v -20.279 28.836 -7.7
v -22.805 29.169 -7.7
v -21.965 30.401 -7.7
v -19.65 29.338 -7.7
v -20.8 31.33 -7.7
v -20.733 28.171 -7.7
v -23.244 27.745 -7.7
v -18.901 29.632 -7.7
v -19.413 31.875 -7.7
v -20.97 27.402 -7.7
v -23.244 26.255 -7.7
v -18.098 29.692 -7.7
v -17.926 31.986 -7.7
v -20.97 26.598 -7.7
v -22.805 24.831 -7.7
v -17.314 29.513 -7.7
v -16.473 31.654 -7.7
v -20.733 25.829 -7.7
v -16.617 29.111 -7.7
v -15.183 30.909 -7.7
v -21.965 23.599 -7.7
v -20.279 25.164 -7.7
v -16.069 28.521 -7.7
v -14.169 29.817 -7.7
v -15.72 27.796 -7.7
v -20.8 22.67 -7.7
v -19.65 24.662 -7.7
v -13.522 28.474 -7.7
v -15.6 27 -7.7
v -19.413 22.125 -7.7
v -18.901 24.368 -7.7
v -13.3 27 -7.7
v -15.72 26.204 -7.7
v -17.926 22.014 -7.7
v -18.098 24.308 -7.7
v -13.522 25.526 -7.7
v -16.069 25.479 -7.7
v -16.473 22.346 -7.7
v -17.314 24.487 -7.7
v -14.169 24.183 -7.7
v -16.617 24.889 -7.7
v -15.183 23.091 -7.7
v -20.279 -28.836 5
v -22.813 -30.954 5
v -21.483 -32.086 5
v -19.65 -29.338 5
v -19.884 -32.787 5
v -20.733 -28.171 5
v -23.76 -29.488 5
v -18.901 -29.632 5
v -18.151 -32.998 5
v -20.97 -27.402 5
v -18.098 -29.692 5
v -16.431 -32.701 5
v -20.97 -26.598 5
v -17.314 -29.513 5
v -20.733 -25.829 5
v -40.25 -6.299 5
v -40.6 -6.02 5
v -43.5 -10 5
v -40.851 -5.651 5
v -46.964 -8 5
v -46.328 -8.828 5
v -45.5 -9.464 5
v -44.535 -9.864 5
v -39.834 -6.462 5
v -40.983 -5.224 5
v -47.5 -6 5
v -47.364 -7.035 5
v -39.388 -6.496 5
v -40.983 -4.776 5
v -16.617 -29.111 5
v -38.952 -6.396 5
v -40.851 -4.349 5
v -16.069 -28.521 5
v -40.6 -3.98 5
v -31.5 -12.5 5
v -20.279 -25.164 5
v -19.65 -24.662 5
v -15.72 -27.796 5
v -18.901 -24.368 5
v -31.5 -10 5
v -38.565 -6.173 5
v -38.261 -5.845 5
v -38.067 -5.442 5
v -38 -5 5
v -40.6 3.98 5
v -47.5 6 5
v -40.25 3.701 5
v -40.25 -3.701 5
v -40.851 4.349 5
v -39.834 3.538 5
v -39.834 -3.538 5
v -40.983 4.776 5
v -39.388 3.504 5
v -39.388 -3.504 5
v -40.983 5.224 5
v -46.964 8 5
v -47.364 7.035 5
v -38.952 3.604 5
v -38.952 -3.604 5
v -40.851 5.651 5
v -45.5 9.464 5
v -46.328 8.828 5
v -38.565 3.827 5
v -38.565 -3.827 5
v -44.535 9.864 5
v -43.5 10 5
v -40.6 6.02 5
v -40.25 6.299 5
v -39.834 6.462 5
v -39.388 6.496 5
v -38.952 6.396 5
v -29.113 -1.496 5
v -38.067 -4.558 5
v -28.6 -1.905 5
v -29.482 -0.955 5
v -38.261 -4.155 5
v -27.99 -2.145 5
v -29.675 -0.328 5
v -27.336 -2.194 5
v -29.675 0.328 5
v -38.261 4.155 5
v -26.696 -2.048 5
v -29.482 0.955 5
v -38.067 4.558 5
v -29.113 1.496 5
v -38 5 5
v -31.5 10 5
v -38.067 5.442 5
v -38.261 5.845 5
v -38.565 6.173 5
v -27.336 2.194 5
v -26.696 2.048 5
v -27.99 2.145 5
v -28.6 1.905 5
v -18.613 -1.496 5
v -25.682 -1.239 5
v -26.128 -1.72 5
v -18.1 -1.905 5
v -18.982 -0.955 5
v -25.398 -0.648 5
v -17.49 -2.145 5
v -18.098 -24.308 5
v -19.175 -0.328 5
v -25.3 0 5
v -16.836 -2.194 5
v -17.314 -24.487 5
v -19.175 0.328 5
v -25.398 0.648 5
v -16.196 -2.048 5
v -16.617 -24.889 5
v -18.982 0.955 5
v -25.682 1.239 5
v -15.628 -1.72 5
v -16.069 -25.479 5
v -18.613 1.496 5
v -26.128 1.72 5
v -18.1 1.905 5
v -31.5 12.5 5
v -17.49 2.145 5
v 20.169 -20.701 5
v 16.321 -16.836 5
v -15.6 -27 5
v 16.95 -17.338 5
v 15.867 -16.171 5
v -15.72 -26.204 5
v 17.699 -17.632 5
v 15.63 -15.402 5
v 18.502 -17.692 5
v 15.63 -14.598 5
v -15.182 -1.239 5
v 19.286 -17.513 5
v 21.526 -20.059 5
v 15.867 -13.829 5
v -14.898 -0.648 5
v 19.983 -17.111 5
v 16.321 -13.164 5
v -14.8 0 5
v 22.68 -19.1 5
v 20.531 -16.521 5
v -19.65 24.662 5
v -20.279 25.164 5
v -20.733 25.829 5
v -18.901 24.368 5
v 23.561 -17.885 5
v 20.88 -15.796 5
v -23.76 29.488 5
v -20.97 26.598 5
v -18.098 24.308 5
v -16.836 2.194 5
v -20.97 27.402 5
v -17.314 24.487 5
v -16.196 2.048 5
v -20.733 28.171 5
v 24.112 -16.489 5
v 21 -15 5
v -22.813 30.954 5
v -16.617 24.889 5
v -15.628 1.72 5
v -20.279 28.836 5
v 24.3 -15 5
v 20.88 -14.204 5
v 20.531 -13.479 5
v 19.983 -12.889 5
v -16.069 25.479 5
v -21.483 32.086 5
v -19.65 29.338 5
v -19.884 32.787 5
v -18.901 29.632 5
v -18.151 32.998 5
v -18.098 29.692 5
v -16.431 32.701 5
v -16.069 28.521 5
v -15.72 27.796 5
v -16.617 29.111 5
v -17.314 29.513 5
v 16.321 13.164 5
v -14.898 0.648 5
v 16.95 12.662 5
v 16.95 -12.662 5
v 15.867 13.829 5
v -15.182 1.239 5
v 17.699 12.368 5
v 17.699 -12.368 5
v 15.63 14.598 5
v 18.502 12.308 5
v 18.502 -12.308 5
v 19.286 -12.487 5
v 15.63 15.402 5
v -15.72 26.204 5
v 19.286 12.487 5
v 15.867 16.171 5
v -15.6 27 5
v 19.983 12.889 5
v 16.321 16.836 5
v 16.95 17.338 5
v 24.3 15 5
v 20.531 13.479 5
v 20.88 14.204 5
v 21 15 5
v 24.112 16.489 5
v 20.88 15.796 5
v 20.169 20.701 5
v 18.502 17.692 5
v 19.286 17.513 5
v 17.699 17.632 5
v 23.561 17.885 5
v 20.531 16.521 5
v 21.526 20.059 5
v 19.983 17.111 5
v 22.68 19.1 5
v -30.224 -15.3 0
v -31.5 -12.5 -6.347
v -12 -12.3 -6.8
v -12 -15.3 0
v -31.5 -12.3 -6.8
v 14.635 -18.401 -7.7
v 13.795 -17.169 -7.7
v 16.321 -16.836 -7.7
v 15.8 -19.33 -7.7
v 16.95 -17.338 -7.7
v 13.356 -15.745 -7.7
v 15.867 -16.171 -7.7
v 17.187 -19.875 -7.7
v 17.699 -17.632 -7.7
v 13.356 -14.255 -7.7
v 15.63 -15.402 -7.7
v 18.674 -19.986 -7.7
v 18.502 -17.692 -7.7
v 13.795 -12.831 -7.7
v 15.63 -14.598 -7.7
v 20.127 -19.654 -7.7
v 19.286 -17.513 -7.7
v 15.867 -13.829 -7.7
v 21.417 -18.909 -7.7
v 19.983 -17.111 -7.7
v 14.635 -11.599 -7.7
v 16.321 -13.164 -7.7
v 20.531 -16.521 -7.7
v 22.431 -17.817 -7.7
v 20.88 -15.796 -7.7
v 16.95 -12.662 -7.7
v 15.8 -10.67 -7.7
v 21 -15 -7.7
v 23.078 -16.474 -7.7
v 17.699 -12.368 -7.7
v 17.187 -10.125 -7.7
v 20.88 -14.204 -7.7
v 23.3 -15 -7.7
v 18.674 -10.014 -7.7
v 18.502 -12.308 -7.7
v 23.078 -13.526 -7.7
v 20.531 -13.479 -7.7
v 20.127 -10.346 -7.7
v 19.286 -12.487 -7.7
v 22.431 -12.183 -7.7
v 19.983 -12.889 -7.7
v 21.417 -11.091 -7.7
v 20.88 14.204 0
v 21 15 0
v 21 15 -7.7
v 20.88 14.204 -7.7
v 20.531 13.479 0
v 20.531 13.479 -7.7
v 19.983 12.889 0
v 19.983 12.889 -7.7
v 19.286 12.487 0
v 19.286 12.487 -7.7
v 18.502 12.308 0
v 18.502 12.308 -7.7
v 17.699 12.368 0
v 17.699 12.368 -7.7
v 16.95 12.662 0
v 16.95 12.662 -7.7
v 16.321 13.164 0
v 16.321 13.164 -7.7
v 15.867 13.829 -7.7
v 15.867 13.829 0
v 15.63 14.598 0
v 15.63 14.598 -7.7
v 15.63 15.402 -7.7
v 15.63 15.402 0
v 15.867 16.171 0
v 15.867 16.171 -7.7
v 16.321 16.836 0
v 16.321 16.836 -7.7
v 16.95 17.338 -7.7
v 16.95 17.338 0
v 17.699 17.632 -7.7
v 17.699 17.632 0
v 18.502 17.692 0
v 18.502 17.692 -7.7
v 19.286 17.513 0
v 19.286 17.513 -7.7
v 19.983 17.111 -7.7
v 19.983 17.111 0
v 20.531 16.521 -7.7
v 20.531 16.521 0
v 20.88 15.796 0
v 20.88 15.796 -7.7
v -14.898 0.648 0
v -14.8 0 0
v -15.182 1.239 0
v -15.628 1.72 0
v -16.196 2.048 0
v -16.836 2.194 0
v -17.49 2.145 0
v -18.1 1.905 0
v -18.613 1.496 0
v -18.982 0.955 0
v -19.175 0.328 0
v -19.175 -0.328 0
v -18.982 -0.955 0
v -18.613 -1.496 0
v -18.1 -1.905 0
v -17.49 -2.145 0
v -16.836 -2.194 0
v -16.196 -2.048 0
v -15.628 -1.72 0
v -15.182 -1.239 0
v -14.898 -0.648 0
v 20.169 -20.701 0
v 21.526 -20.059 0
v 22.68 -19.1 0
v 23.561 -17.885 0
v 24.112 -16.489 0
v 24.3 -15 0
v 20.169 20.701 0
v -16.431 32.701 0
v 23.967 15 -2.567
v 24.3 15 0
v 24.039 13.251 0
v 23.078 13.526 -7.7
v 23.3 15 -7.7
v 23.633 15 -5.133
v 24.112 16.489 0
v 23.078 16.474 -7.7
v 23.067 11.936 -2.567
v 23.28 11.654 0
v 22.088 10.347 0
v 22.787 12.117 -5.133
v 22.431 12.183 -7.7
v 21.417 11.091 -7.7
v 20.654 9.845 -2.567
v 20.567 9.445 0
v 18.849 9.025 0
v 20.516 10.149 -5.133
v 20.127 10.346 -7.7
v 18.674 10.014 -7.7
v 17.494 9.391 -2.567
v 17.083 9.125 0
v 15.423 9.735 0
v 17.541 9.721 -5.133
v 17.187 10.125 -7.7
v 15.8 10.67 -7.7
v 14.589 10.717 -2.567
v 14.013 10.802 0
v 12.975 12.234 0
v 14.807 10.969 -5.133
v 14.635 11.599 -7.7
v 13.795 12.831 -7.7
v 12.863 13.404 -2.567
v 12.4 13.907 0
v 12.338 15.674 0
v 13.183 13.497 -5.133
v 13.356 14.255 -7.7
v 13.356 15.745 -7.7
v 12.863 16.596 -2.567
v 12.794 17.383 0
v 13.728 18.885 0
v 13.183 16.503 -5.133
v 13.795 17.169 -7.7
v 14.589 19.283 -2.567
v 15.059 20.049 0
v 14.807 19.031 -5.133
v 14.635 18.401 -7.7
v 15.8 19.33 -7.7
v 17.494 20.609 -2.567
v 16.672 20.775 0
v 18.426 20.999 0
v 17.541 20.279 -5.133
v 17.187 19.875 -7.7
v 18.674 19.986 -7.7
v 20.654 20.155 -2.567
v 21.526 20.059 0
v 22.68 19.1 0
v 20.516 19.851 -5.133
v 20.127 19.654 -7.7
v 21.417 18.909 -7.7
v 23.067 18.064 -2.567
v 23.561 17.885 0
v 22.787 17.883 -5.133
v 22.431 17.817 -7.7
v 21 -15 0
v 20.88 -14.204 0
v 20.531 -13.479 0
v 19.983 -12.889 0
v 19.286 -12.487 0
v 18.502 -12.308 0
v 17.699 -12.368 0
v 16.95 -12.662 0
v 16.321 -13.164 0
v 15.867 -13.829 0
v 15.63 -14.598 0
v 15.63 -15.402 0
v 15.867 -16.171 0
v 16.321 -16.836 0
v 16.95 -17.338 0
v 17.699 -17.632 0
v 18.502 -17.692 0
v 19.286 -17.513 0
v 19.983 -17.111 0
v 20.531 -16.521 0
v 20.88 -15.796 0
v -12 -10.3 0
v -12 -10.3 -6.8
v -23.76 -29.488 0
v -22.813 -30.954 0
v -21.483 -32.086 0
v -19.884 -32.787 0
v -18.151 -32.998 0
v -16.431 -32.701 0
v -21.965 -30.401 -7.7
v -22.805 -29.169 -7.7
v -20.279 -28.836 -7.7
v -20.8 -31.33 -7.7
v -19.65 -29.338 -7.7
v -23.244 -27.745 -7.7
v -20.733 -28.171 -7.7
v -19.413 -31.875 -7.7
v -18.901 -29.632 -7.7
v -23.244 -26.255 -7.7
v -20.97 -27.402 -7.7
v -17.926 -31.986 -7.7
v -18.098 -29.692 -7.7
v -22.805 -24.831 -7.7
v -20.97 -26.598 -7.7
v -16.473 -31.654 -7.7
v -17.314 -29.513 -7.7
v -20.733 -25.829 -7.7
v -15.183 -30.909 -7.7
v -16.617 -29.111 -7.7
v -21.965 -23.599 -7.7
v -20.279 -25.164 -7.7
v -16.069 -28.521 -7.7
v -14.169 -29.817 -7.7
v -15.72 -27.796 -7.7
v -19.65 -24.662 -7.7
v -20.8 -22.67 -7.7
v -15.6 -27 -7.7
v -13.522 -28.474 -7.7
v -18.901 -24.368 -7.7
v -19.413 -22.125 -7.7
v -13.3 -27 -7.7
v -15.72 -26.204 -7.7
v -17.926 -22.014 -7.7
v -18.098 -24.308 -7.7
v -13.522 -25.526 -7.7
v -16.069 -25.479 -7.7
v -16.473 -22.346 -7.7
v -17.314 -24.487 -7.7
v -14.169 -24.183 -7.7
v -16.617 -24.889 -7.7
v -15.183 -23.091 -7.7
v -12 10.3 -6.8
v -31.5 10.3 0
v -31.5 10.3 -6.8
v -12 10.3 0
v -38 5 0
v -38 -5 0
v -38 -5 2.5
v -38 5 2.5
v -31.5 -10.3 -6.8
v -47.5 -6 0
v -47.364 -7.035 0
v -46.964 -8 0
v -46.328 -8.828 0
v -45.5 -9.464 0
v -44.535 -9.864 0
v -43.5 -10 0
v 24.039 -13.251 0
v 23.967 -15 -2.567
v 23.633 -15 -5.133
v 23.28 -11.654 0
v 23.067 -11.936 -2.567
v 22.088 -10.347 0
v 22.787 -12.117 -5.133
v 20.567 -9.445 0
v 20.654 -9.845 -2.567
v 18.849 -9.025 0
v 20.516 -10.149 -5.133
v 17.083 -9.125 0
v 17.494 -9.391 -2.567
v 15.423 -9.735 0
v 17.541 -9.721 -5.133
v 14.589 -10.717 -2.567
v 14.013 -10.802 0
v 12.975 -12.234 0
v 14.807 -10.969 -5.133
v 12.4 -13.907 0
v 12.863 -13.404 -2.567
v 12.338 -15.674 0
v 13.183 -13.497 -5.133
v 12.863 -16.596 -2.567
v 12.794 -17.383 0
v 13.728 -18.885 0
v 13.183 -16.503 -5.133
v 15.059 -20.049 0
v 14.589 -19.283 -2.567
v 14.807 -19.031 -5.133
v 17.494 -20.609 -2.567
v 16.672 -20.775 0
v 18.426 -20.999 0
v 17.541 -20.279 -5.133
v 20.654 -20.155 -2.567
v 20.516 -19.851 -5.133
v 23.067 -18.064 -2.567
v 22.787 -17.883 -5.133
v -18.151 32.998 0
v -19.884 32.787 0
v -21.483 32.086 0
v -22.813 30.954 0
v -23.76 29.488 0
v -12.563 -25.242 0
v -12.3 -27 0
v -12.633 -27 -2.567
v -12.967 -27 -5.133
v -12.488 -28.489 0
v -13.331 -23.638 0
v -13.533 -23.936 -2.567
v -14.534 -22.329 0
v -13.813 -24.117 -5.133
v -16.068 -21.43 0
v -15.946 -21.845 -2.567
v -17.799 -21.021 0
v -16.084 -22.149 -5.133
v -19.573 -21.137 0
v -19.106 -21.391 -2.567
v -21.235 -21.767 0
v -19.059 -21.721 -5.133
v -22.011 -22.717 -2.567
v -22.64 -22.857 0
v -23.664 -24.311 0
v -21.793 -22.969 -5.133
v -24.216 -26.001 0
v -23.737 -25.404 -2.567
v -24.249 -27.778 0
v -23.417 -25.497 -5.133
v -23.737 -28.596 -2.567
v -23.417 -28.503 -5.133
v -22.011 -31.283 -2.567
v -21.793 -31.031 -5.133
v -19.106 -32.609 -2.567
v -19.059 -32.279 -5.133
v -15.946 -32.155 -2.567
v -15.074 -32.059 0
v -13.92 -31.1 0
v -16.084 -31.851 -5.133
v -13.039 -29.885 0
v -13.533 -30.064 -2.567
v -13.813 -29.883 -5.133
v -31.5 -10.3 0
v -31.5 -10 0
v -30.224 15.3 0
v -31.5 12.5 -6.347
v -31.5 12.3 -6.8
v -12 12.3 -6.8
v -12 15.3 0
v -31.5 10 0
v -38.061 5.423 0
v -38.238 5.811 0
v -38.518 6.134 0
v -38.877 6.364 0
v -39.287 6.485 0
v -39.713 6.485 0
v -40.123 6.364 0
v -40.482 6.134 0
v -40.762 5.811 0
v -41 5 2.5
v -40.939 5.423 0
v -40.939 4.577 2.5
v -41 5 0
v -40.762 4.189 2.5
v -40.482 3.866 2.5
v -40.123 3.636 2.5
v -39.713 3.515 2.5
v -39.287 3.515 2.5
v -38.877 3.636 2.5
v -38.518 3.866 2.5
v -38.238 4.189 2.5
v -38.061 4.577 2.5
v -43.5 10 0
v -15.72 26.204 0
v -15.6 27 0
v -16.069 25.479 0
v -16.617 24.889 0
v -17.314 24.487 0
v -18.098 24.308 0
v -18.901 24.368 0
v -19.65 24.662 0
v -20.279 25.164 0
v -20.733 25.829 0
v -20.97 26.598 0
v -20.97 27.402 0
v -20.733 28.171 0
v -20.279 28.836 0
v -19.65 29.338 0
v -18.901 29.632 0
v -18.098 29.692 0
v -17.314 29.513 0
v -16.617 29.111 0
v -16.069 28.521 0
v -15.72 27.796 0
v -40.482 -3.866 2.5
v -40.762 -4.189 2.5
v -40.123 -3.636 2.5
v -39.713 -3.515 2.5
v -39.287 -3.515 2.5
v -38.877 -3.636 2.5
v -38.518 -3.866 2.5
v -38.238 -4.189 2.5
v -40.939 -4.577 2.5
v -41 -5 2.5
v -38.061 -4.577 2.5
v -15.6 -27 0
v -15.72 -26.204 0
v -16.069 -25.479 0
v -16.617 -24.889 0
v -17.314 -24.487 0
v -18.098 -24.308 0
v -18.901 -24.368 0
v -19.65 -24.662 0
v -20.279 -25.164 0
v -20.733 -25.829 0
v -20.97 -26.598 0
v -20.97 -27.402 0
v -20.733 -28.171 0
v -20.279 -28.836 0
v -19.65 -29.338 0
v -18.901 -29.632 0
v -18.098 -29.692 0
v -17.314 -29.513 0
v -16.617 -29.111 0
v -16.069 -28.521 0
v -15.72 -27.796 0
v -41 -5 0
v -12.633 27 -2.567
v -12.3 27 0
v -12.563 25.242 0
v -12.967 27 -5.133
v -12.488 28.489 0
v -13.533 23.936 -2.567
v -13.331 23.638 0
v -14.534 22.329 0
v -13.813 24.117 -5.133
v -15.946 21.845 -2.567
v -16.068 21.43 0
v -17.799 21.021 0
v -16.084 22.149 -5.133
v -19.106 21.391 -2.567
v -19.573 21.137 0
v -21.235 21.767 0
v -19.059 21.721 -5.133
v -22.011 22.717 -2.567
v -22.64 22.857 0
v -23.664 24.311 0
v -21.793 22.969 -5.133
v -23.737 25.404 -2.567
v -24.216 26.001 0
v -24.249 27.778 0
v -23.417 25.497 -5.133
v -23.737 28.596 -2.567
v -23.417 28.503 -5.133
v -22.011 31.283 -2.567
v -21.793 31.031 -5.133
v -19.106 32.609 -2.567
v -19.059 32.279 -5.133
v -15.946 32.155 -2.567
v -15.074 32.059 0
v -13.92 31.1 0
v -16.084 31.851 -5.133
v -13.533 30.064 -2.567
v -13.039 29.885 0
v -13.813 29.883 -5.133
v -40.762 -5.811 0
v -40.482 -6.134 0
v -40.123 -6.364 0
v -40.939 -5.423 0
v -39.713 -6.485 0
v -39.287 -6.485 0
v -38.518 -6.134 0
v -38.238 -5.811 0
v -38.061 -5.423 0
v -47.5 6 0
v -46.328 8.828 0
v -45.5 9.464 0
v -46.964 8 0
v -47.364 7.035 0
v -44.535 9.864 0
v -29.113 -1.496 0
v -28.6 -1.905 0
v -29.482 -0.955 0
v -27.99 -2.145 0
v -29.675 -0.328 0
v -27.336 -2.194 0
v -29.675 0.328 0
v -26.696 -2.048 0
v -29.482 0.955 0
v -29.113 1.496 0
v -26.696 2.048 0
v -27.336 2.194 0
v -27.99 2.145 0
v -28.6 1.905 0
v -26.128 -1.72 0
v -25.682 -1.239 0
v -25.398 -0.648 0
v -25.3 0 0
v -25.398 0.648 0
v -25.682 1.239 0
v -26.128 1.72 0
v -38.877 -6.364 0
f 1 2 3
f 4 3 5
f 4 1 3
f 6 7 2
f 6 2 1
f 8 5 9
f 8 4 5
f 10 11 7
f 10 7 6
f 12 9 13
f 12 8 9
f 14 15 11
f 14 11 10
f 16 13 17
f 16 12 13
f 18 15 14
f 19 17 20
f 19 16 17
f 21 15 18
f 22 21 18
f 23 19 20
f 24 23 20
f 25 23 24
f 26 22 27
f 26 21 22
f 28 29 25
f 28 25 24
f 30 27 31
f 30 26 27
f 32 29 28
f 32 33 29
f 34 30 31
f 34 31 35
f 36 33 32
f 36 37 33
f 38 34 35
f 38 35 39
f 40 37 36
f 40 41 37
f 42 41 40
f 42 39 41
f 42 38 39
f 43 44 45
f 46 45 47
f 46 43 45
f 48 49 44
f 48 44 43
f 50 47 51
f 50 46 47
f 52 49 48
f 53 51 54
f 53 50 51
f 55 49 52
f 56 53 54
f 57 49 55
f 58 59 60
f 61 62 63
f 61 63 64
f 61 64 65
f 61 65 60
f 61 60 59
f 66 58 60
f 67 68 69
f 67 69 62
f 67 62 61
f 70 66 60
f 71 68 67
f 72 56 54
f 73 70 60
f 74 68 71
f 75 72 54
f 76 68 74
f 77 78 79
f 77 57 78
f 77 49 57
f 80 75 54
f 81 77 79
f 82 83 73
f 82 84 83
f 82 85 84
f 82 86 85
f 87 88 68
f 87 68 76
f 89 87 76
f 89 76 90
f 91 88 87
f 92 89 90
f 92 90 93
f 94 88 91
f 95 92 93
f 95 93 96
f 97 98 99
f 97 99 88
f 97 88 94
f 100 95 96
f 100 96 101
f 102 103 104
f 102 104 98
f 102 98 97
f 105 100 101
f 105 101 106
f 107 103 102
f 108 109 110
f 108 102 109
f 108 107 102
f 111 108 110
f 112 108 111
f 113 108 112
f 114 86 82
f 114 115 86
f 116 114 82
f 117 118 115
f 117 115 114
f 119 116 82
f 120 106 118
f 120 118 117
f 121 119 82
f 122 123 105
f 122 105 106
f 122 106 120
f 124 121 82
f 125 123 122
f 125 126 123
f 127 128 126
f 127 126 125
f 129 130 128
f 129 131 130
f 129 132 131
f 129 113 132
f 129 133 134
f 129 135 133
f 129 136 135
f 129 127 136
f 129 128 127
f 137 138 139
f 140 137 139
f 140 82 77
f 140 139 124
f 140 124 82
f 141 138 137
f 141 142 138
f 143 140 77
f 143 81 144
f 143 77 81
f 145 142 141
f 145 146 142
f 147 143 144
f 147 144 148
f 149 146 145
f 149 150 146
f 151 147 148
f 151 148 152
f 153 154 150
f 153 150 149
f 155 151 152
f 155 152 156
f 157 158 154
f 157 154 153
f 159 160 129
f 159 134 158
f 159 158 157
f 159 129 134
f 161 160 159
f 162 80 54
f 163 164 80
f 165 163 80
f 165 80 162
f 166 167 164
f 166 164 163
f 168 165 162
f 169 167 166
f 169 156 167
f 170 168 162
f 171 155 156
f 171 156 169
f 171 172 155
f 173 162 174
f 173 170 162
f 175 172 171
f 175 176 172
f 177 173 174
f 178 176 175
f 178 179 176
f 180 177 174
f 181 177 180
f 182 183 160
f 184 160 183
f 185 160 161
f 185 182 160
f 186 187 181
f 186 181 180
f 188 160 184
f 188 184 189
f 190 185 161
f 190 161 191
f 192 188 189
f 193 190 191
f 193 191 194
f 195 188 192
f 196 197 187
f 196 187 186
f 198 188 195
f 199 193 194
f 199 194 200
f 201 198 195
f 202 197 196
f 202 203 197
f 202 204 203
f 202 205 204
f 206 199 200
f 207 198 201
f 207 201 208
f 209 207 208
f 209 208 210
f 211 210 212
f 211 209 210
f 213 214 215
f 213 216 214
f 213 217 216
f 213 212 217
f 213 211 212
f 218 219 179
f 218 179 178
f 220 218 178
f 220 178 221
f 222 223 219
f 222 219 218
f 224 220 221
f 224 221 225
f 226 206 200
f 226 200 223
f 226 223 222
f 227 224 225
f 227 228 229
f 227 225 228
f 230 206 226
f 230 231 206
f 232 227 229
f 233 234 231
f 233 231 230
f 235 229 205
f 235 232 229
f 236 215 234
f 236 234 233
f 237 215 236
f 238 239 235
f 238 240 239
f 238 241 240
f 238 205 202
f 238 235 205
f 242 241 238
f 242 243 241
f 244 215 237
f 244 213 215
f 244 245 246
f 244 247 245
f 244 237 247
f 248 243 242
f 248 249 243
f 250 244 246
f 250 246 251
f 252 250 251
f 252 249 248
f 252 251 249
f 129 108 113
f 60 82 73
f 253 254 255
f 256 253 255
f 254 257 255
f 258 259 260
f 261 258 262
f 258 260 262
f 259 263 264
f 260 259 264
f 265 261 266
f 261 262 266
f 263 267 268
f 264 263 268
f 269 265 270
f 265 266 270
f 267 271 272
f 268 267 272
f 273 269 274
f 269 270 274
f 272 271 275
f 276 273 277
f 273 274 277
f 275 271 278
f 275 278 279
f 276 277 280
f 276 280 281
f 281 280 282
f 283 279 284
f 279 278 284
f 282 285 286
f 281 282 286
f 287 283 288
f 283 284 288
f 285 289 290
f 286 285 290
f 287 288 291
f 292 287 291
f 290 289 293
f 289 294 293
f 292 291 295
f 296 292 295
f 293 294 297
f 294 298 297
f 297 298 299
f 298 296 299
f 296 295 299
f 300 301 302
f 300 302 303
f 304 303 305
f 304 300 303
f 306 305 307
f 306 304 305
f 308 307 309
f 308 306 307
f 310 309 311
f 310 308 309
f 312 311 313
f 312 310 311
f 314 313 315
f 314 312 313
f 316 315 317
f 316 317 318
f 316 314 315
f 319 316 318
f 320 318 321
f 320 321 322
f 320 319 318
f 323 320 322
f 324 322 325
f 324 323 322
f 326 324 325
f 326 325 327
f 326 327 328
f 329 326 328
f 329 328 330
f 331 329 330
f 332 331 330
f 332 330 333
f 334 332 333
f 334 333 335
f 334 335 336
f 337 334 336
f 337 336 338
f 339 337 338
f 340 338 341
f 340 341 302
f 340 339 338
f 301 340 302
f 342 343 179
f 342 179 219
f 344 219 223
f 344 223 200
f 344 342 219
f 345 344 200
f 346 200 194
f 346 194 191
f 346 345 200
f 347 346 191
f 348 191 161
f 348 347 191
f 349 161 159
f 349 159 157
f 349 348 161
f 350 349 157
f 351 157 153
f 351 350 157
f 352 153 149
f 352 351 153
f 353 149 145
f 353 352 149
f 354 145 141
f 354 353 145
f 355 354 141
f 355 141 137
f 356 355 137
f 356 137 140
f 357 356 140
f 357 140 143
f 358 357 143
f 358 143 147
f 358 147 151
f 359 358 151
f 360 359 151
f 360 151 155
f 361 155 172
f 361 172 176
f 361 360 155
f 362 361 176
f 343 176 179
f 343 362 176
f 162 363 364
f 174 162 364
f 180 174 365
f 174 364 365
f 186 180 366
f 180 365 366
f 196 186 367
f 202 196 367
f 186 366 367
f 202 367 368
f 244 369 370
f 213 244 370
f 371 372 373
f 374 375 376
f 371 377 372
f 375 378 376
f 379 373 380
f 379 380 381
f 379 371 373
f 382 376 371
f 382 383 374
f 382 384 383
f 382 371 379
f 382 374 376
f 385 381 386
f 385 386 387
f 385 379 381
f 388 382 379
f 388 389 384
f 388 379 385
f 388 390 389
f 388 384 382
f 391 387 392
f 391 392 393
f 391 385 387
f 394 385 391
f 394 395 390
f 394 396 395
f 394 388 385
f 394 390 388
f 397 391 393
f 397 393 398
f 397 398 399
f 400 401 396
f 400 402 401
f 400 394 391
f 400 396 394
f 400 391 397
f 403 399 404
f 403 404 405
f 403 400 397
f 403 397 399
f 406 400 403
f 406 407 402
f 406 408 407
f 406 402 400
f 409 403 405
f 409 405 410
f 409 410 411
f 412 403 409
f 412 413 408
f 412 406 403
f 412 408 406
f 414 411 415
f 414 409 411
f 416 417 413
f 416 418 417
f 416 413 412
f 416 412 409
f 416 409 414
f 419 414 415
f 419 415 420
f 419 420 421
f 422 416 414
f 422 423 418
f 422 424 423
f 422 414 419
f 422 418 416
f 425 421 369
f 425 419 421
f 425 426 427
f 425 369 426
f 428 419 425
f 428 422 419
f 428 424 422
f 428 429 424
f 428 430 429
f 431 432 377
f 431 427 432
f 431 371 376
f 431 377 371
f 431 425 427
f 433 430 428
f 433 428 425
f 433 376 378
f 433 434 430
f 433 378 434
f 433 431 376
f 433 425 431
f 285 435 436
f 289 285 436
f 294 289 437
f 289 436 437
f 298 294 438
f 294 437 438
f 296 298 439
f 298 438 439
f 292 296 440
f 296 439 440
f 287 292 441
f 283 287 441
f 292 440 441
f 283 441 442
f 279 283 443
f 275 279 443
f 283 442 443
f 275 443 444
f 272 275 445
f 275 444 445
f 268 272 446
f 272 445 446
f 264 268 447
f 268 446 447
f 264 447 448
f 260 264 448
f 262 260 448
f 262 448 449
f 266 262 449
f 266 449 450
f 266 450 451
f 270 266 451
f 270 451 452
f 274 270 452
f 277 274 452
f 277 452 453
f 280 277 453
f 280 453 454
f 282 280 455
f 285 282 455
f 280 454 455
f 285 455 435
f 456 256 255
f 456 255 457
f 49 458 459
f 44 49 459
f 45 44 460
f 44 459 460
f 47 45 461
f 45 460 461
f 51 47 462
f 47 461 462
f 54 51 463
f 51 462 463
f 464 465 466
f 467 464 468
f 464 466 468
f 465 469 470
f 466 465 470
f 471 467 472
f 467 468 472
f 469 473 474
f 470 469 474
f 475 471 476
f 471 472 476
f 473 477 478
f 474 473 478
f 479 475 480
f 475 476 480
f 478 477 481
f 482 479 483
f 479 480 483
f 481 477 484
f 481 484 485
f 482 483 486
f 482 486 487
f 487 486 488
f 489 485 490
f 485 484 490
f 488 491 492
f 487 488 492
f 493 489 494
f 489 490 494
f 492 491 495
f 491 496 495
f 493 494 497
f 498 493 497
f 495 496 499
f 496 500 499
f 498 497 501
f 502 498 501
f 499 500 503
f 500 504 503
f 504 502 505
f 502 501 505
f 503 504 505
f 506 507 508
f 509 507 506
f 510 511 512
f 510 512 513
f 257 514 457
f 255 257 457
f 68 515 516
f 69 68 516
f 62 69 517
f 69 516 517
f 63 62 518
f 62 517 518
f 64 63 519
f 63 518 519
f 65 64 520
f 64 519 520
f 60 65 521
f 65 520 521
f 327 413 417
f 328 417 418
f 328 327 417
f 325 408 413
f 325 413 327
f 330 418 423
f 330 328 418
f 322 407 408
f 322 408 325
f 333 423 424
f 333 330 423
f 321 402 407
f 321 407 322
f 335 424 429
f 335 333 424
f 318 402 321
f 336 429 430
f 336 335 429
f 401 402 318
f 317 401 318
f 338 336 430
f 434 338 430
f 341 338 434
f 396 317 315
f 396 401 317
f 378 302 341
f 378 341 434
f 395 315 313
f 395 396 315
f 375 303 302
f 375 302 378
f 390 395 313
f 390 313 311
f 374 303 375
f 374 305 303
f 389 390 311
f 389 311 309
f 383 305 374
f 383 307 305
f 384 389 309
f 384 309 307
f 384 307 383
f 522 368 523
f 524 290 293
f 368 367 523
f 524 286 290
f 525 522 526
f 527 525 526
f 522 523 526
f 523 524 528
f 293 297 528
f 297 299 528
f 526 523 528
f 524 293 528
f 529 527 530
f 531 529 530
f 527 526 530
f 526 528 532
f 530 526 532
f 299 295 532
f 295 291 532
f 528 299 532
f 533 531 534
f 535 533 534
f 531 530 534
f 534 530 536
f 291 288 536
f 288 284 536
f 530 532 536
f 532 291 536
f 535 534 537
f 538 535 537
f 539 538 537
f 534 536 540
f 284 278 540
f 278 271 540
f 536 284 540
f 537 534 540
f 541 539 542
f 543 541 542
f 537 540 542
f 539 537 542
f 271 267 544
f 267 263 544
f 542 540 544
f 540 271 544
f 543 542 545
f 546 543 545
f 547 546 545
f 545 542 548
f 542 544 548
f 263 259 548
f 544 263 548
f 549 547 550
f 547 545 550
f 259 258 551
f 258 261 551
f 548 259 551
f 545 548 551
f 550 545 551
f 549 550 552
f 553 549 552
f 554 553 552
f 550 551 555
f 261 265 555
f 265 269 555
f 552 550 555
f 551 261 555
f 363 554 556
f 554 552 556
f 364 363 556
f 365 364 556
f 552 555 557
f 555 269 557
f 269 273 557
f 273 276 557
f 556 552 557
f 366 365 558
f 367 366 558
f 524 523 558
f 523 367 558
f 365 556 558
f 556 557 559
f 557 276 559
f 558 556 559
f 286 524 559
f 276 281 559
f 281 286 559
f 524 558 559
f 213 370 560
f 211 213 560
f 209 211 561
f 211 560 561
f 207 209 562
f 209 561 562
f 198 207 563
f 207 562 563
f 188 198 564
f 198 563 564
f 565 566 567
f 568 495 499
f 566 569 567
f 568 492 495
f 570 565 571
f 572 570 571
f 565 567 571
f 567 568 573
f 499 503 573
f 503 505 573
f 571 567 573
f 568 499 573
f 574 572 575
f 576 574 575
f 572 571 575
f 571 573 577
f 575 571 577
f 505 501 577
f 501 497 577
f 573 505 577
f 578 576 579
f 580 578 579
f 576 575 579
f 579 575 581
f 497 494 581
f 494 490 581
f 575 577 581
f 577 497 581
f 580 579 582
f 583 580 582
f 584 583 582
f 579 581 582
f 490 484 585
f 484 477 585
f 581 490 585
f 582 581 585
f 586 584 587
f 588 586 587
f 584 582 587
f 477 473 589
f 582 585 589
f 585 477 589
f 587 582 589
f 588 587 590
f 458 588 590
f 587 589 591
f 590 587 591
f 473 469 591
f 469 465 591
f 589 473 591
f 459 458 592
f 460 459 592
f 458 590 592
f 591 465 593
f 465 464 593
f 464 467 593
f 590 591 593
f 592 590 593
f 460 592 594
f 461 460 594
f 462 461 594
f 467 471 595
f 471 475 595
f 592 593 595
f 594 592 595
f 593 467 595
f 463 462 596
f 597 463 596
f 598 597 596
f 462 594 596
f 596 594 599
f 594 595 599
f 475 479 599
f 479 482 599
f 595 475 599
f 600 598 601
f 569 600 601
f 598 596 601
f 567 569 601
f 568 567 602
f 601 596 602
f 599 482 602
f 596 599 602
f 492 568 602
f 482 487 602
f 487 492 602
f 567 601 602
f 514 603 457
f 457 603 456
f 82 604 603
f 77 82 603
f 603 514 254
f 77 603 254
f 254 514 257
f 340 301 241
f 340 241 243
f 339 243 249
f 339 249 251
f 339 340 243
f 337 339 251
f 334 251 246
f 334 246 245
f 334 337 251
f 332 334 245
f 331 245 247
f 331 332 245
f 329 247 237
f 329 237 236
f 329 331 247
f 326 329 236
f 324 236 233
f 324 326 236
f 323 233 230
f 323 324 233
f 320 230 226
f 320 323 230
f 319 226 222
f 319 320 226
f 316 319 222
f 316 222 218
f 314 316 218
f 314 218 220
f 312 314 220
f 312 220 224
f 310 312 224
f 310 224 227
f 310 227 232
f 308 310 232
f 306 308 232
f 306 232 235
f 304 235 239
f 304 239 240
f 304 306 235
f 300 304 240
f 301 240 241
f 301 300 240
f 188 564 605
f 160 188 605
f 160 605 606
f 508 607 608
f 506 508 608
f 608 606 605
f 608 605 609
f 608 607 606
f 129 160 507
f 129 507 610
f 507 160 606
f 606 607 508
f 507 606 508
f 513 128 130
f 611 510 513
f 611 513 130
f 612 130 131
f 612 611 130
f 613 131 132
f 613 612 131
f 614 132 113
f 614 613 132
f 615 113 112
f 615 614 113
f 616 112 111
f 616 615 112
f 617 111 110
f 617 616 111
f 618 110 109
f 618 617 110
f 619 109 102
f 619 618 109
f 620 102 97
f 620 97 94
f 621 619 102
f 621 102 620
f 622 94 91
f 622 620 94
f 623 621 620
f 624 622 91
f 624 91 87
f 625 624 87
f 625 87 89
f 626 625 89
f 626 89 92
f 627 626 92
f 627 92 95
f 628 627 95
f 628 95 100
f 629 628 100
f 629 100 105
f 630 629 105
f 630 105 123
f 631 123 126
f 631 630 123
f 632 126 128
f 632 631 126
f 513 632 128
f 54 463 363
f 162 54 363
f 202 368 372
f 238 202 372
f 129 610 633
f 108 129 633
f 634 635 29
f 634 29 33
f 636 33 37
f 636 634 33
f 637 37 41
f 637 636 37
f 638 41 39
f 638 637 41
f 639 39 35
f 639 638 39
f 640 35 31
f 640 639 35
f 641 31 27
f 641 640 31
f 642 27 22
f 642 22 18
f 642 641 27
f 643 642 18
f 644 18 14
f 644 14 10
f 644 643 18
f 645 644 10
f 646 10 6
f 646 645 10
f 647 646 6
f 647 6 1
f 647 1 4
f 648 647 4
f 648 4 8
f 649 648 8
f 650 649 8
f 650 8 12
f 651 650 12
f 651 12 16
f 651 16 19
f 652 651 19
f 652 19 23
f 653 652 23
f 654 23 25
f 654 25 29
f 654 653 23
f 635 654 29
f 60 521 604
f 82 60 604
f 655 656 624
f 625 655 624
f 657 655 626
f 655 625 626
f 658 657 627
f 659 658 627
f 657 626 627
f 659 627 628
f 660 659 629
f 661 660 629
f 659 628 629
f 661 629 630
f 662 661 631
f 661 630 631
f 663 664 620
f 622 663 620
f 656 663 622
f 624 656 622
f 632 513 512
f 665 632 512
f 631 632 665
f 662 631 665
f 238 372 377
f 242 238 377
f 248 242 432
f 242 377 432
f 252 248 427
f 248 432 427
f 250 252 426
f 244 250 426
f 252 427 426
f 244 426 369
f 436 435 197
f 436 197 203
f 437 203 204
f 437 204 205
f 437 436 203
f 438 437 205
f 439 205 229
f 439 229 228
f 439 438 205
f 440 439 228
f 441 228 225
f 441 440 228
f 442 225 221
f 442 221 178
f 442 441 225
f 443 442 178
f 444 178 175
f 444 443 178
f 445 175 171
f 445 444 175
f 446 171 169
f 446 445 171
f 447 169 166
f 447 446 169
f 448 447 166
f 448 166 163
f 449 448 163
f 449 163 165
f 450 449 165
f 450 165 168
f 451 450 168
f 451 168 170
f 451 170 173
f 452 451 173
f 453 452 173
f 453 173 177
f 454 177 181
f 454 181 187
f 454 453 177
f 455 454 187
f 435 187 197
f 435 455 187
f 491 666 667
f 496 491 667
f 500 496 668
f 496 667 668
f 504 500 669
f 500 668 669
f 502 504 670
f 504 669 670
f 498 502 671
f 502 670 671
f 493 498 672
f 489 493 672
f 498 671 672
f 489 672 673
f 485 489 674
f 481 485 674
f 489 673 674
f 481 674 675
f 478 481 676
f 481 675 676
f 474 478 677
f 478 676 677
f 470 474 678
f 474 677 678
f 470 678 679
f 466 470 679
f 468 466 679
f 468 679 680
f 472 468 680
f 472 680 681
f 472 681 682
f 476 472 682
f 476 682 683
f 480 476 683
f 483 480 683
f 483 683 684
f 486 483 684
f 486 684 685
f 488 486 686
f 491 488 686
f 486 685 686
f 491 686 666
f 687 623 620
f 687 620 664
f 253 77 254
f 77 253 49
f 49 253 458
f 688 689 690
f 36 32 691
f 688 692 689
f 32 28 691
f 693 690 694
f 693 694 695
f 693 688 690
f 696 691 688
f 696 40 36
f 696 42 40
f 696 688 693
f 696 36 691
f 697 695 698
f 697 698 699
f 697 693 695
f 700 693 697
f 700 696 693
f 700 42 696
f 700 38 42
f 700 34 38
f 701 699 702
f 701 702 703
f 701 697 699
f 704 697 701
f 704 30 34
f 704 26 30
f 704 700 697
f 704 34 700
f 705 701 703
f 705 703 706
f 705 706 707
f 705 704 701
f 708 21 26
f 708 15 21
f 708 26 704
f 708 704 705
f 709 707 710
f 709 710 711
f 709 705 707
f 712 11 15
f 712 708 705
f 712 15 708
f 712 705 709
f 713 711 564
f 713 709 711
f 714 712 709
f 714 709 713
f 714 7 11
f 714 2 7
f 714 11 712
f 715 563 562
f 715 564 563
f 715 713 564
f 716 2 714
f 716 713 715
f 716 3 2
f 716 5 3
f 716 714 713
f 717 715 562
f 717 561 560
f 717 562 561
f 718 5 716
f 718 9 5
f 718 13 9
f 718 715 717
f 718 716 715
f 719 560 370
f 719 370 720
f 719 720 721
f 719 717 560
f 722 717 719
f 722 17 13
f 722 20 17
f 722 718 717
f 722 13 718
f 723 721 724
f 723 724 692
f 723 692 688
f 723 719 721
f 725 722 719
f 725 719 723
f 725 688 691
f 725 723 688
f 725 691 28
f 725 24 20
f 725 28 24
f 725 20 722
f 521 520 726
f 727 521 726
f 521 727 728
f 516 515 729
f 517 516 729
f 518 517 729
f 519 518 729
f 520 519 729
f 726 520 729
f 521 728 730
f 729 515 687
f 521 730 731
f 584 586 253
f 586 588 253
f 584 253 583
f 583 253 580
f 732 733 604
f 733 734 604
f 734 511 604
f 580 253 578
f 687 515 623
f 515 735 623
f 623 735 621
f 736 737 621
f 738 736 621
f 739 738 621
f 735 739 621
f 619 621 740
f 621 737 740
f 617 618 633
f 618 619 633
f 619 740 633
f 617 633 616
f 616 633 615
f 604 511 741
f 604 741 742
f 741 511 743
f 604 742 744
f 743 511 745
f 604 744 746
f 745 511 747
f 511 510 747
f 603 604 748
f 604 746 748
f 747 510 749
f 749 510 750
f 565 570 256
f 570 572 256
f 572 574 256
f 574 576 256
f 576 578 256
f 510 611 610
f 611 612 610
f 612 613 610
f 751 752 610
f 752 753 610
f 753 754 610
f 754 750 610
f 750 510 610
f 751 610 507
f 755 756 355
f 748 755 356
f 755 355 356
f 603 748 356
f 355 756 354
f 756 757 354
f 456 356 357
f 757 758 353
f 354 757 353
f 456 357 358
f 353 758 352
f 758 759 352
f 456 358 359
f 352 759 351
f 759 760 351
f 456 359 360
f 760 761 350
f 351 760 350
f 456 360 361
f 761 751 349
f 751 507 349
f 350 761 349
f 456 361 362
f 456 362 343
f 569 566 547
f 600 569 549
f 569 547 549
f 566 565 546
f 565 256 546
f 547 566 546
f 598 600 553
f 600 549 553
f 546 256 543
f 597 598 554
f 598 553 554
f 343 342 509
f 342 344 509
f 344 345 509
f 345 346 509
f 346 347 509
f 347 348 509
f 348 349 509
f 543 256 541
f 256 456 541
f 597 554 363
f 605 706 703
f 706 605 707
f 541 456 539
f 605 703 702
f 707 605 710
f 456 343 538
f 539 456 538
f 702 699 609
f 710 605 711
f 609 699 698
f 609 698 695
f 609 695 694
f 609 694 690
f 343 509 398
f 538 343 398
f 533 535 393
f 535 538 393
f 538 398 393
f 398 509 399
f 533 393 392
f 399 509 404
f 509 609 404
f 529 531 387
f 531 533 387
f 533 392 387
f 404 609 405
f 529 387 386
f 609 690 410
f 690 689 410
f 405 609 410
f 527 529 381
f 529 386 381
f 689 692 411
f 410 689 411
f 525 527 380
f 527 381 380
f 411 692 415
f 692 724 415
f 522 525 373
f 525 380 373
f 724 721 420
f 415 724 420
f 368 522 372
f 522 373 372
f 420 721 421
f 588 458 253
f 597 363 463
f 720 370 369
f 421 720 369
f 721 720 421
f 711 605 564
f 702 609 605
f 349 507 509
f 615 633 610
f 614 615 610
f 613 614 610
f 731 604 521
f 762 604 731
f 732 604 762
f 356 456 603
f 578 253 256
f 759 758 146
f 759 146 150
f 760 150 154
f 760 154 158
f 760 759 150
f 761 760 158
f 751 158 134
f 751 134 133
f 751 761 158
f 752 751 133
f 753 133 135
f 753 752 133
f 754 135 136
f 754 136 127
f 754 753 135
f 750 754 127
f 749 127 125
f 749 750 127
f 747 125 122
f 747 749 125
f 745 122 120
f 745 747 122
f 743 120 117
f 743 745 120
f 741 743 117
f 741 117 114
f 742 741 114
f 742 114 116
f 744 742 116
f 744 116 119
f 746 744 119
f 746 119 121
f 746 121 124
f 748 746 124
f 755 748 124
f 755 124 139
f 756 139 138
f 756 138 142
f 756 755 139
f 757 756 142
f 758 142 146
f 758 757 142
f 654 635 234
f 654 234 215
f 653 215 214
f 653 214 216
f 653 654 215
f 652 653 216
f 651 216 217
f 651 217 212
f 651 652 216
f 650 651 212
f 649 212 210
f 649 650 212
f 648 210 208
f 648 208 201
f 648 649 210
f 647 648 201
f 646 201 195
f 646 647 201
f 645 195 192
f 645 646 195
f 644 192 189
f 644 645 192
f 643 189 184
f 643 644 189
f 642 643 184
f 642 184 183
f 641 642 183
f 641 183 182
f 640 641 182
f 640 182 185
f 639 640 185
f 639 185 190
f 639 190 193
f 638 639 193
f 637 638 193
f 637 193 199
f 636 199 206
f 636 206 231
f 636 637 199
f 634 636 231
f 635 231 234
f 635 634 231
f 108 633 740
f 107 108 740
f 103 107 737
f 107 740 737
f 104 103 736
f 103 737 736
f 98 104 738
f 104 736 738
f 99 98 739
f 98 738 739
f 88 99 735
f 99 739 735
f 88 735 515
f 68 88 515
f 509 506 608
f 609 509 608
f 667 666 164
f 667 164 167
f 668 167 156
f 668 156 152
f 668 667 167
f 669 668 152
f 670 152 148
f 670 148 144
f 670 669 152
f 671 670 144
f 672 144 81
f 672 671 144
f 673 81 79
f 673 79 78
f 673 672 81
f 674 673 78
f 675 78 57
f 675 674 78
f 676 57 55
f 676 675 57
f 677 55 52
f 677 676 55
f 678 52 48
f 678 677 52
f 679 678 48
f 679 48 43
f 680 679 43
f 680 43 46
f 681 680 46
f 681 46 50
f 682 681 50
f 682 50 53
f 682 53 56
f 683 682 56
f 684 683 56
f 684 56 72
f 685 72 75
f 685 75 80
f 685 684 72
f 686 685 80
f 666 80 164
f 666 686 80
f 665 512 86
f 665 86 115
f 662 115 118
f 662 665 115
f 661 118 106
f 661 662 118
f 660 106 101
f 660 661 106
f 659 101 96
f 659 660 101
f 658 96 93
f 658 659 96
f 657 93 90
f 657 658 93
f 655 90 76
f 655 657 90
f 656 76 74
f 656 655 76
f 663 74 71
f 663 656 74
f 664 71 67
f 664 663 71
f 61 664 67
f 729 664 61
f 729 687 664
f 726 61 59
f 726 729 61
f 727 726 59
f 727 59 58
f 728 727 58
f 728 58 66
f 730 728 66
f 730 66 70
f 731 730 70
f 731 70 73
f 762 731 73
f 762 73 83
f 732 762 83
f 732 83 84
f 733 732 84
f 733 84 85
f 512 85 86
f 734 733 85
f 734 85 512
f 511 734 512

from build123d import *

# Parameters (mm, degrees)
SKETCH_1_R          = 2.2
SKETCH_1_R_2        = 2.7
SKETCH_1_R_3        = 1.5
EXTRUDE_1_DEPTH     = 5
SKETCH_1_4_W        = 19.5
SKETCH_1_4_H        = 2
EXTRUDE_2_DEPTH     = 6.8
CHAMFER_1_SIZE2     = 6.8
CHAMFER_1_SIZE      = 3
CHAMFER_2_SIZE2     = 6.8
CHAMFER_2_SIZE      = 3
CUT_EXTRUDE_1_DEPTH = 2.5


with BuildPart() as part:
    # 草图1 → 凸台-拉伸1 (new body)
    with BuildSketch(Plane.XY):
        with BuildLine():
            Line((-23.759975961, 29.487702254), (-31.5, 12.5))
            Line((-31.5, 12.5), (-31.5, 10))
            Line((-31.5, 10), (-43.5, 10))
            ThreePointArc((-43.5, 10), (-46.328427125, 8.828427125), (-47.5, 6))
            Line((-47.5, 6), (-47.5, -6))
            ThreePointArc((-47.5, -6), (-46.328427125, -8.828427125), (-43.5, -10))
            Line((-43.5, -10), (-31.5, -10))
            Line((-31.5, -10), (-31.5, -12.5))
            Line((-31.5, -12.5), (-23.759975961, -29.487702254))
            ThreePointArc((-23.759975961, -29.487702254), (-20.709389548, -32.494983349), (-16.430695985, -32.701377246))
            Line((-16.430695985, -32.701377246), (20.169304015, -20.701377246))
            ThreePointArc((20.169304015, -20.701377246), (23.158797387, -18.520239758), (24.3, -15))
            Line((24.3, -15), (24.3, 15))
            ThreePointArc((24.3, 15), (23.158797387, 18.520239758), (20.169304015, 20.701377246))
            Line((20.169304015, 20.701377246), (-16.430695985, 32.701377246))
            ThreePointArc((-16.430695985, 32.701377246), (-20.709389548, 32.494983349), (-23.759975961, 29.487702254))
        make_face()
        with Locations((-17, 0)):
            Circle(SKETCH_1_R, mode=Mode.SUBTRACT)
        with Locations((-27.5, 0)):
            Circle(SKETCH_1_R, mode=Mode.SUBTRACT)
        with Locations((18.3, 15)):
            Circle(SKETCH_1_R_2, mode=Mode.SUBTRACT)
        with Locations((-39.5, 5)):
            Circle(SKETCH_1_R_3, mode=Mode.SUBTRACT)
        with Locations((-39.5, -5)):
            Circle(SKETCH_1_R_3, mode=Mode.SUBTRACT)
        with Locations((18.3, -15)):
            Circle(SKETCH_1_R_2, mode=Mode.SUBTRACT)
        with Locations((-18.3, 27)):
            Circle(SKETCH_1_R_2, mode=Mode.SUBTRACT)
        with Locations((-18.3, -27)):
            Circle(SKETCH_1_R_2, mode=Mode.SUBTRACT)
    extrude(amount=EXTRUDE_1_DEPTH)

    # 草图4 → 旋转1 (revolve)
    with BuildSketch(Plane(origin=(6.216937636, 18.961659791, 0), x_dir=(-0.9502295409734977, 0.31155066917163887, 0), z_dir=(-0.31155066917163887, -0.9502295409734977, 0)), mode=Mode.PRIVATE) as revolve_1_sk:
        Polygon((-6.715940562, 0), (-7.715940562, 7.7), (-10.015940562, 7.7), (-10.015940562, 0), align=None)
    revolve_1 = revolve(revolve_1_sk.sketch.rotate(Axis((18.3, 15, 4.45283877), (0, 0, -1)), 161.847294113), axis=Axis((18.3, 15, 4.45283877), (0, 0, -1)))

    # 草图4<3> → 旋转2 (revolve)
    with BuildSketch(Plane(origin=(6.216937636, 18.961659791, 0), x_dir=(-0.9502295409734977, 0.31155066917163887, 0), z_dir=(-0.31155066917163887, -0.9502295409734977, 0)), mode=Mode.PRIVATE) as revolve_2_sk:
        Polygon((30.801068667, 7.7), (28.501068667, 7.7), (28.501068667, 0), (31.801068667, 0), align=None)
    revolve_2 = revolve(revolve_2_sk.sketch.rotate(Axis((-18.3, 27, 0), (0, 0, -1)), 161.847294113), axis=Axis((-18.3, 27, 0), (0, 0, -1)))

    # 镜向1: 旋转1, 旋转2 across plane
    add(revolve_1.mirror(Plane.ZX))
    add(revolve_2.mirror(Plane.ZX))

    # 草图1<4> → 凸台-拉伸2 (add)
    with BuildSketch(Plane.XY):
        with Locations((-21.75, 11.3)):
            Rectangle(SKETCH_1_4_W, SKETCH_1_4_H)
        with Locations((-21.75, -11.3)):
            Rectangle(SKETCH_1_4_W, SKETCH_1_4_H)
    extrude(amount=-EXTRUDE_2_DEPTH)

    # 倒角1
    chamfer_1_edges = [part.edges().sort_by_distance(p)[0] for p in [
        (-21.75, 12.3, 0),
    ]]
    chamfer_1_side = [part.faces().sort_by_distance(p)[0] for p in [
        (-21.75, 12.36, 0),
    ]]
    chamfer(chamfer_1_edges, length=CHAMFER_1_SIZE - 0.0001, length2=CHAMFER_1_SIZE2 - 0.0001, reference=chamfer_1_side[0])  # a hair under: the kernel refuses the full size

    # 倒角2
    chamfer_2_edges = [part.edges().sort_by_distance(p)[0] for p in [
        (-21.75, -12.3, 0),
    ]]
    chamfer_2_side = [part.faces().sort_by_distance(p)[0] for p in [
        (-21.75, -12.36, 0),
    ]]
    chamfer(chamfer_2_edges, length=CHAMFER_2_SIZE - 0.0001, length2=CHAMFER_2_SIZE2 - 0.0001, reference=chamfer_2_side[0])  # a hair under: the kernel refuses the full size

    # 草图5 → 切除-拉伸1 (cut)
    with BuildSketch(Plane(origin=(0, 0, 0), x_dir=(-1, 0, 0), z_dir=(0, 0, -1))):
        with BuildLine():
            Line((41, 5), (41, -5))
            ThreePointArc((41, -5), (39.5, -6.5), (38, -5))
            Line((38, -5), (38, 5))
            ThreePointArc((38, 5), (39.5, 6.5), (41, 5))
        make_face()
    extrude(amount=-CUT_EXTRUDE_1_DEPTH, mode=Mode.SUBTRACT)


solid = part.part
